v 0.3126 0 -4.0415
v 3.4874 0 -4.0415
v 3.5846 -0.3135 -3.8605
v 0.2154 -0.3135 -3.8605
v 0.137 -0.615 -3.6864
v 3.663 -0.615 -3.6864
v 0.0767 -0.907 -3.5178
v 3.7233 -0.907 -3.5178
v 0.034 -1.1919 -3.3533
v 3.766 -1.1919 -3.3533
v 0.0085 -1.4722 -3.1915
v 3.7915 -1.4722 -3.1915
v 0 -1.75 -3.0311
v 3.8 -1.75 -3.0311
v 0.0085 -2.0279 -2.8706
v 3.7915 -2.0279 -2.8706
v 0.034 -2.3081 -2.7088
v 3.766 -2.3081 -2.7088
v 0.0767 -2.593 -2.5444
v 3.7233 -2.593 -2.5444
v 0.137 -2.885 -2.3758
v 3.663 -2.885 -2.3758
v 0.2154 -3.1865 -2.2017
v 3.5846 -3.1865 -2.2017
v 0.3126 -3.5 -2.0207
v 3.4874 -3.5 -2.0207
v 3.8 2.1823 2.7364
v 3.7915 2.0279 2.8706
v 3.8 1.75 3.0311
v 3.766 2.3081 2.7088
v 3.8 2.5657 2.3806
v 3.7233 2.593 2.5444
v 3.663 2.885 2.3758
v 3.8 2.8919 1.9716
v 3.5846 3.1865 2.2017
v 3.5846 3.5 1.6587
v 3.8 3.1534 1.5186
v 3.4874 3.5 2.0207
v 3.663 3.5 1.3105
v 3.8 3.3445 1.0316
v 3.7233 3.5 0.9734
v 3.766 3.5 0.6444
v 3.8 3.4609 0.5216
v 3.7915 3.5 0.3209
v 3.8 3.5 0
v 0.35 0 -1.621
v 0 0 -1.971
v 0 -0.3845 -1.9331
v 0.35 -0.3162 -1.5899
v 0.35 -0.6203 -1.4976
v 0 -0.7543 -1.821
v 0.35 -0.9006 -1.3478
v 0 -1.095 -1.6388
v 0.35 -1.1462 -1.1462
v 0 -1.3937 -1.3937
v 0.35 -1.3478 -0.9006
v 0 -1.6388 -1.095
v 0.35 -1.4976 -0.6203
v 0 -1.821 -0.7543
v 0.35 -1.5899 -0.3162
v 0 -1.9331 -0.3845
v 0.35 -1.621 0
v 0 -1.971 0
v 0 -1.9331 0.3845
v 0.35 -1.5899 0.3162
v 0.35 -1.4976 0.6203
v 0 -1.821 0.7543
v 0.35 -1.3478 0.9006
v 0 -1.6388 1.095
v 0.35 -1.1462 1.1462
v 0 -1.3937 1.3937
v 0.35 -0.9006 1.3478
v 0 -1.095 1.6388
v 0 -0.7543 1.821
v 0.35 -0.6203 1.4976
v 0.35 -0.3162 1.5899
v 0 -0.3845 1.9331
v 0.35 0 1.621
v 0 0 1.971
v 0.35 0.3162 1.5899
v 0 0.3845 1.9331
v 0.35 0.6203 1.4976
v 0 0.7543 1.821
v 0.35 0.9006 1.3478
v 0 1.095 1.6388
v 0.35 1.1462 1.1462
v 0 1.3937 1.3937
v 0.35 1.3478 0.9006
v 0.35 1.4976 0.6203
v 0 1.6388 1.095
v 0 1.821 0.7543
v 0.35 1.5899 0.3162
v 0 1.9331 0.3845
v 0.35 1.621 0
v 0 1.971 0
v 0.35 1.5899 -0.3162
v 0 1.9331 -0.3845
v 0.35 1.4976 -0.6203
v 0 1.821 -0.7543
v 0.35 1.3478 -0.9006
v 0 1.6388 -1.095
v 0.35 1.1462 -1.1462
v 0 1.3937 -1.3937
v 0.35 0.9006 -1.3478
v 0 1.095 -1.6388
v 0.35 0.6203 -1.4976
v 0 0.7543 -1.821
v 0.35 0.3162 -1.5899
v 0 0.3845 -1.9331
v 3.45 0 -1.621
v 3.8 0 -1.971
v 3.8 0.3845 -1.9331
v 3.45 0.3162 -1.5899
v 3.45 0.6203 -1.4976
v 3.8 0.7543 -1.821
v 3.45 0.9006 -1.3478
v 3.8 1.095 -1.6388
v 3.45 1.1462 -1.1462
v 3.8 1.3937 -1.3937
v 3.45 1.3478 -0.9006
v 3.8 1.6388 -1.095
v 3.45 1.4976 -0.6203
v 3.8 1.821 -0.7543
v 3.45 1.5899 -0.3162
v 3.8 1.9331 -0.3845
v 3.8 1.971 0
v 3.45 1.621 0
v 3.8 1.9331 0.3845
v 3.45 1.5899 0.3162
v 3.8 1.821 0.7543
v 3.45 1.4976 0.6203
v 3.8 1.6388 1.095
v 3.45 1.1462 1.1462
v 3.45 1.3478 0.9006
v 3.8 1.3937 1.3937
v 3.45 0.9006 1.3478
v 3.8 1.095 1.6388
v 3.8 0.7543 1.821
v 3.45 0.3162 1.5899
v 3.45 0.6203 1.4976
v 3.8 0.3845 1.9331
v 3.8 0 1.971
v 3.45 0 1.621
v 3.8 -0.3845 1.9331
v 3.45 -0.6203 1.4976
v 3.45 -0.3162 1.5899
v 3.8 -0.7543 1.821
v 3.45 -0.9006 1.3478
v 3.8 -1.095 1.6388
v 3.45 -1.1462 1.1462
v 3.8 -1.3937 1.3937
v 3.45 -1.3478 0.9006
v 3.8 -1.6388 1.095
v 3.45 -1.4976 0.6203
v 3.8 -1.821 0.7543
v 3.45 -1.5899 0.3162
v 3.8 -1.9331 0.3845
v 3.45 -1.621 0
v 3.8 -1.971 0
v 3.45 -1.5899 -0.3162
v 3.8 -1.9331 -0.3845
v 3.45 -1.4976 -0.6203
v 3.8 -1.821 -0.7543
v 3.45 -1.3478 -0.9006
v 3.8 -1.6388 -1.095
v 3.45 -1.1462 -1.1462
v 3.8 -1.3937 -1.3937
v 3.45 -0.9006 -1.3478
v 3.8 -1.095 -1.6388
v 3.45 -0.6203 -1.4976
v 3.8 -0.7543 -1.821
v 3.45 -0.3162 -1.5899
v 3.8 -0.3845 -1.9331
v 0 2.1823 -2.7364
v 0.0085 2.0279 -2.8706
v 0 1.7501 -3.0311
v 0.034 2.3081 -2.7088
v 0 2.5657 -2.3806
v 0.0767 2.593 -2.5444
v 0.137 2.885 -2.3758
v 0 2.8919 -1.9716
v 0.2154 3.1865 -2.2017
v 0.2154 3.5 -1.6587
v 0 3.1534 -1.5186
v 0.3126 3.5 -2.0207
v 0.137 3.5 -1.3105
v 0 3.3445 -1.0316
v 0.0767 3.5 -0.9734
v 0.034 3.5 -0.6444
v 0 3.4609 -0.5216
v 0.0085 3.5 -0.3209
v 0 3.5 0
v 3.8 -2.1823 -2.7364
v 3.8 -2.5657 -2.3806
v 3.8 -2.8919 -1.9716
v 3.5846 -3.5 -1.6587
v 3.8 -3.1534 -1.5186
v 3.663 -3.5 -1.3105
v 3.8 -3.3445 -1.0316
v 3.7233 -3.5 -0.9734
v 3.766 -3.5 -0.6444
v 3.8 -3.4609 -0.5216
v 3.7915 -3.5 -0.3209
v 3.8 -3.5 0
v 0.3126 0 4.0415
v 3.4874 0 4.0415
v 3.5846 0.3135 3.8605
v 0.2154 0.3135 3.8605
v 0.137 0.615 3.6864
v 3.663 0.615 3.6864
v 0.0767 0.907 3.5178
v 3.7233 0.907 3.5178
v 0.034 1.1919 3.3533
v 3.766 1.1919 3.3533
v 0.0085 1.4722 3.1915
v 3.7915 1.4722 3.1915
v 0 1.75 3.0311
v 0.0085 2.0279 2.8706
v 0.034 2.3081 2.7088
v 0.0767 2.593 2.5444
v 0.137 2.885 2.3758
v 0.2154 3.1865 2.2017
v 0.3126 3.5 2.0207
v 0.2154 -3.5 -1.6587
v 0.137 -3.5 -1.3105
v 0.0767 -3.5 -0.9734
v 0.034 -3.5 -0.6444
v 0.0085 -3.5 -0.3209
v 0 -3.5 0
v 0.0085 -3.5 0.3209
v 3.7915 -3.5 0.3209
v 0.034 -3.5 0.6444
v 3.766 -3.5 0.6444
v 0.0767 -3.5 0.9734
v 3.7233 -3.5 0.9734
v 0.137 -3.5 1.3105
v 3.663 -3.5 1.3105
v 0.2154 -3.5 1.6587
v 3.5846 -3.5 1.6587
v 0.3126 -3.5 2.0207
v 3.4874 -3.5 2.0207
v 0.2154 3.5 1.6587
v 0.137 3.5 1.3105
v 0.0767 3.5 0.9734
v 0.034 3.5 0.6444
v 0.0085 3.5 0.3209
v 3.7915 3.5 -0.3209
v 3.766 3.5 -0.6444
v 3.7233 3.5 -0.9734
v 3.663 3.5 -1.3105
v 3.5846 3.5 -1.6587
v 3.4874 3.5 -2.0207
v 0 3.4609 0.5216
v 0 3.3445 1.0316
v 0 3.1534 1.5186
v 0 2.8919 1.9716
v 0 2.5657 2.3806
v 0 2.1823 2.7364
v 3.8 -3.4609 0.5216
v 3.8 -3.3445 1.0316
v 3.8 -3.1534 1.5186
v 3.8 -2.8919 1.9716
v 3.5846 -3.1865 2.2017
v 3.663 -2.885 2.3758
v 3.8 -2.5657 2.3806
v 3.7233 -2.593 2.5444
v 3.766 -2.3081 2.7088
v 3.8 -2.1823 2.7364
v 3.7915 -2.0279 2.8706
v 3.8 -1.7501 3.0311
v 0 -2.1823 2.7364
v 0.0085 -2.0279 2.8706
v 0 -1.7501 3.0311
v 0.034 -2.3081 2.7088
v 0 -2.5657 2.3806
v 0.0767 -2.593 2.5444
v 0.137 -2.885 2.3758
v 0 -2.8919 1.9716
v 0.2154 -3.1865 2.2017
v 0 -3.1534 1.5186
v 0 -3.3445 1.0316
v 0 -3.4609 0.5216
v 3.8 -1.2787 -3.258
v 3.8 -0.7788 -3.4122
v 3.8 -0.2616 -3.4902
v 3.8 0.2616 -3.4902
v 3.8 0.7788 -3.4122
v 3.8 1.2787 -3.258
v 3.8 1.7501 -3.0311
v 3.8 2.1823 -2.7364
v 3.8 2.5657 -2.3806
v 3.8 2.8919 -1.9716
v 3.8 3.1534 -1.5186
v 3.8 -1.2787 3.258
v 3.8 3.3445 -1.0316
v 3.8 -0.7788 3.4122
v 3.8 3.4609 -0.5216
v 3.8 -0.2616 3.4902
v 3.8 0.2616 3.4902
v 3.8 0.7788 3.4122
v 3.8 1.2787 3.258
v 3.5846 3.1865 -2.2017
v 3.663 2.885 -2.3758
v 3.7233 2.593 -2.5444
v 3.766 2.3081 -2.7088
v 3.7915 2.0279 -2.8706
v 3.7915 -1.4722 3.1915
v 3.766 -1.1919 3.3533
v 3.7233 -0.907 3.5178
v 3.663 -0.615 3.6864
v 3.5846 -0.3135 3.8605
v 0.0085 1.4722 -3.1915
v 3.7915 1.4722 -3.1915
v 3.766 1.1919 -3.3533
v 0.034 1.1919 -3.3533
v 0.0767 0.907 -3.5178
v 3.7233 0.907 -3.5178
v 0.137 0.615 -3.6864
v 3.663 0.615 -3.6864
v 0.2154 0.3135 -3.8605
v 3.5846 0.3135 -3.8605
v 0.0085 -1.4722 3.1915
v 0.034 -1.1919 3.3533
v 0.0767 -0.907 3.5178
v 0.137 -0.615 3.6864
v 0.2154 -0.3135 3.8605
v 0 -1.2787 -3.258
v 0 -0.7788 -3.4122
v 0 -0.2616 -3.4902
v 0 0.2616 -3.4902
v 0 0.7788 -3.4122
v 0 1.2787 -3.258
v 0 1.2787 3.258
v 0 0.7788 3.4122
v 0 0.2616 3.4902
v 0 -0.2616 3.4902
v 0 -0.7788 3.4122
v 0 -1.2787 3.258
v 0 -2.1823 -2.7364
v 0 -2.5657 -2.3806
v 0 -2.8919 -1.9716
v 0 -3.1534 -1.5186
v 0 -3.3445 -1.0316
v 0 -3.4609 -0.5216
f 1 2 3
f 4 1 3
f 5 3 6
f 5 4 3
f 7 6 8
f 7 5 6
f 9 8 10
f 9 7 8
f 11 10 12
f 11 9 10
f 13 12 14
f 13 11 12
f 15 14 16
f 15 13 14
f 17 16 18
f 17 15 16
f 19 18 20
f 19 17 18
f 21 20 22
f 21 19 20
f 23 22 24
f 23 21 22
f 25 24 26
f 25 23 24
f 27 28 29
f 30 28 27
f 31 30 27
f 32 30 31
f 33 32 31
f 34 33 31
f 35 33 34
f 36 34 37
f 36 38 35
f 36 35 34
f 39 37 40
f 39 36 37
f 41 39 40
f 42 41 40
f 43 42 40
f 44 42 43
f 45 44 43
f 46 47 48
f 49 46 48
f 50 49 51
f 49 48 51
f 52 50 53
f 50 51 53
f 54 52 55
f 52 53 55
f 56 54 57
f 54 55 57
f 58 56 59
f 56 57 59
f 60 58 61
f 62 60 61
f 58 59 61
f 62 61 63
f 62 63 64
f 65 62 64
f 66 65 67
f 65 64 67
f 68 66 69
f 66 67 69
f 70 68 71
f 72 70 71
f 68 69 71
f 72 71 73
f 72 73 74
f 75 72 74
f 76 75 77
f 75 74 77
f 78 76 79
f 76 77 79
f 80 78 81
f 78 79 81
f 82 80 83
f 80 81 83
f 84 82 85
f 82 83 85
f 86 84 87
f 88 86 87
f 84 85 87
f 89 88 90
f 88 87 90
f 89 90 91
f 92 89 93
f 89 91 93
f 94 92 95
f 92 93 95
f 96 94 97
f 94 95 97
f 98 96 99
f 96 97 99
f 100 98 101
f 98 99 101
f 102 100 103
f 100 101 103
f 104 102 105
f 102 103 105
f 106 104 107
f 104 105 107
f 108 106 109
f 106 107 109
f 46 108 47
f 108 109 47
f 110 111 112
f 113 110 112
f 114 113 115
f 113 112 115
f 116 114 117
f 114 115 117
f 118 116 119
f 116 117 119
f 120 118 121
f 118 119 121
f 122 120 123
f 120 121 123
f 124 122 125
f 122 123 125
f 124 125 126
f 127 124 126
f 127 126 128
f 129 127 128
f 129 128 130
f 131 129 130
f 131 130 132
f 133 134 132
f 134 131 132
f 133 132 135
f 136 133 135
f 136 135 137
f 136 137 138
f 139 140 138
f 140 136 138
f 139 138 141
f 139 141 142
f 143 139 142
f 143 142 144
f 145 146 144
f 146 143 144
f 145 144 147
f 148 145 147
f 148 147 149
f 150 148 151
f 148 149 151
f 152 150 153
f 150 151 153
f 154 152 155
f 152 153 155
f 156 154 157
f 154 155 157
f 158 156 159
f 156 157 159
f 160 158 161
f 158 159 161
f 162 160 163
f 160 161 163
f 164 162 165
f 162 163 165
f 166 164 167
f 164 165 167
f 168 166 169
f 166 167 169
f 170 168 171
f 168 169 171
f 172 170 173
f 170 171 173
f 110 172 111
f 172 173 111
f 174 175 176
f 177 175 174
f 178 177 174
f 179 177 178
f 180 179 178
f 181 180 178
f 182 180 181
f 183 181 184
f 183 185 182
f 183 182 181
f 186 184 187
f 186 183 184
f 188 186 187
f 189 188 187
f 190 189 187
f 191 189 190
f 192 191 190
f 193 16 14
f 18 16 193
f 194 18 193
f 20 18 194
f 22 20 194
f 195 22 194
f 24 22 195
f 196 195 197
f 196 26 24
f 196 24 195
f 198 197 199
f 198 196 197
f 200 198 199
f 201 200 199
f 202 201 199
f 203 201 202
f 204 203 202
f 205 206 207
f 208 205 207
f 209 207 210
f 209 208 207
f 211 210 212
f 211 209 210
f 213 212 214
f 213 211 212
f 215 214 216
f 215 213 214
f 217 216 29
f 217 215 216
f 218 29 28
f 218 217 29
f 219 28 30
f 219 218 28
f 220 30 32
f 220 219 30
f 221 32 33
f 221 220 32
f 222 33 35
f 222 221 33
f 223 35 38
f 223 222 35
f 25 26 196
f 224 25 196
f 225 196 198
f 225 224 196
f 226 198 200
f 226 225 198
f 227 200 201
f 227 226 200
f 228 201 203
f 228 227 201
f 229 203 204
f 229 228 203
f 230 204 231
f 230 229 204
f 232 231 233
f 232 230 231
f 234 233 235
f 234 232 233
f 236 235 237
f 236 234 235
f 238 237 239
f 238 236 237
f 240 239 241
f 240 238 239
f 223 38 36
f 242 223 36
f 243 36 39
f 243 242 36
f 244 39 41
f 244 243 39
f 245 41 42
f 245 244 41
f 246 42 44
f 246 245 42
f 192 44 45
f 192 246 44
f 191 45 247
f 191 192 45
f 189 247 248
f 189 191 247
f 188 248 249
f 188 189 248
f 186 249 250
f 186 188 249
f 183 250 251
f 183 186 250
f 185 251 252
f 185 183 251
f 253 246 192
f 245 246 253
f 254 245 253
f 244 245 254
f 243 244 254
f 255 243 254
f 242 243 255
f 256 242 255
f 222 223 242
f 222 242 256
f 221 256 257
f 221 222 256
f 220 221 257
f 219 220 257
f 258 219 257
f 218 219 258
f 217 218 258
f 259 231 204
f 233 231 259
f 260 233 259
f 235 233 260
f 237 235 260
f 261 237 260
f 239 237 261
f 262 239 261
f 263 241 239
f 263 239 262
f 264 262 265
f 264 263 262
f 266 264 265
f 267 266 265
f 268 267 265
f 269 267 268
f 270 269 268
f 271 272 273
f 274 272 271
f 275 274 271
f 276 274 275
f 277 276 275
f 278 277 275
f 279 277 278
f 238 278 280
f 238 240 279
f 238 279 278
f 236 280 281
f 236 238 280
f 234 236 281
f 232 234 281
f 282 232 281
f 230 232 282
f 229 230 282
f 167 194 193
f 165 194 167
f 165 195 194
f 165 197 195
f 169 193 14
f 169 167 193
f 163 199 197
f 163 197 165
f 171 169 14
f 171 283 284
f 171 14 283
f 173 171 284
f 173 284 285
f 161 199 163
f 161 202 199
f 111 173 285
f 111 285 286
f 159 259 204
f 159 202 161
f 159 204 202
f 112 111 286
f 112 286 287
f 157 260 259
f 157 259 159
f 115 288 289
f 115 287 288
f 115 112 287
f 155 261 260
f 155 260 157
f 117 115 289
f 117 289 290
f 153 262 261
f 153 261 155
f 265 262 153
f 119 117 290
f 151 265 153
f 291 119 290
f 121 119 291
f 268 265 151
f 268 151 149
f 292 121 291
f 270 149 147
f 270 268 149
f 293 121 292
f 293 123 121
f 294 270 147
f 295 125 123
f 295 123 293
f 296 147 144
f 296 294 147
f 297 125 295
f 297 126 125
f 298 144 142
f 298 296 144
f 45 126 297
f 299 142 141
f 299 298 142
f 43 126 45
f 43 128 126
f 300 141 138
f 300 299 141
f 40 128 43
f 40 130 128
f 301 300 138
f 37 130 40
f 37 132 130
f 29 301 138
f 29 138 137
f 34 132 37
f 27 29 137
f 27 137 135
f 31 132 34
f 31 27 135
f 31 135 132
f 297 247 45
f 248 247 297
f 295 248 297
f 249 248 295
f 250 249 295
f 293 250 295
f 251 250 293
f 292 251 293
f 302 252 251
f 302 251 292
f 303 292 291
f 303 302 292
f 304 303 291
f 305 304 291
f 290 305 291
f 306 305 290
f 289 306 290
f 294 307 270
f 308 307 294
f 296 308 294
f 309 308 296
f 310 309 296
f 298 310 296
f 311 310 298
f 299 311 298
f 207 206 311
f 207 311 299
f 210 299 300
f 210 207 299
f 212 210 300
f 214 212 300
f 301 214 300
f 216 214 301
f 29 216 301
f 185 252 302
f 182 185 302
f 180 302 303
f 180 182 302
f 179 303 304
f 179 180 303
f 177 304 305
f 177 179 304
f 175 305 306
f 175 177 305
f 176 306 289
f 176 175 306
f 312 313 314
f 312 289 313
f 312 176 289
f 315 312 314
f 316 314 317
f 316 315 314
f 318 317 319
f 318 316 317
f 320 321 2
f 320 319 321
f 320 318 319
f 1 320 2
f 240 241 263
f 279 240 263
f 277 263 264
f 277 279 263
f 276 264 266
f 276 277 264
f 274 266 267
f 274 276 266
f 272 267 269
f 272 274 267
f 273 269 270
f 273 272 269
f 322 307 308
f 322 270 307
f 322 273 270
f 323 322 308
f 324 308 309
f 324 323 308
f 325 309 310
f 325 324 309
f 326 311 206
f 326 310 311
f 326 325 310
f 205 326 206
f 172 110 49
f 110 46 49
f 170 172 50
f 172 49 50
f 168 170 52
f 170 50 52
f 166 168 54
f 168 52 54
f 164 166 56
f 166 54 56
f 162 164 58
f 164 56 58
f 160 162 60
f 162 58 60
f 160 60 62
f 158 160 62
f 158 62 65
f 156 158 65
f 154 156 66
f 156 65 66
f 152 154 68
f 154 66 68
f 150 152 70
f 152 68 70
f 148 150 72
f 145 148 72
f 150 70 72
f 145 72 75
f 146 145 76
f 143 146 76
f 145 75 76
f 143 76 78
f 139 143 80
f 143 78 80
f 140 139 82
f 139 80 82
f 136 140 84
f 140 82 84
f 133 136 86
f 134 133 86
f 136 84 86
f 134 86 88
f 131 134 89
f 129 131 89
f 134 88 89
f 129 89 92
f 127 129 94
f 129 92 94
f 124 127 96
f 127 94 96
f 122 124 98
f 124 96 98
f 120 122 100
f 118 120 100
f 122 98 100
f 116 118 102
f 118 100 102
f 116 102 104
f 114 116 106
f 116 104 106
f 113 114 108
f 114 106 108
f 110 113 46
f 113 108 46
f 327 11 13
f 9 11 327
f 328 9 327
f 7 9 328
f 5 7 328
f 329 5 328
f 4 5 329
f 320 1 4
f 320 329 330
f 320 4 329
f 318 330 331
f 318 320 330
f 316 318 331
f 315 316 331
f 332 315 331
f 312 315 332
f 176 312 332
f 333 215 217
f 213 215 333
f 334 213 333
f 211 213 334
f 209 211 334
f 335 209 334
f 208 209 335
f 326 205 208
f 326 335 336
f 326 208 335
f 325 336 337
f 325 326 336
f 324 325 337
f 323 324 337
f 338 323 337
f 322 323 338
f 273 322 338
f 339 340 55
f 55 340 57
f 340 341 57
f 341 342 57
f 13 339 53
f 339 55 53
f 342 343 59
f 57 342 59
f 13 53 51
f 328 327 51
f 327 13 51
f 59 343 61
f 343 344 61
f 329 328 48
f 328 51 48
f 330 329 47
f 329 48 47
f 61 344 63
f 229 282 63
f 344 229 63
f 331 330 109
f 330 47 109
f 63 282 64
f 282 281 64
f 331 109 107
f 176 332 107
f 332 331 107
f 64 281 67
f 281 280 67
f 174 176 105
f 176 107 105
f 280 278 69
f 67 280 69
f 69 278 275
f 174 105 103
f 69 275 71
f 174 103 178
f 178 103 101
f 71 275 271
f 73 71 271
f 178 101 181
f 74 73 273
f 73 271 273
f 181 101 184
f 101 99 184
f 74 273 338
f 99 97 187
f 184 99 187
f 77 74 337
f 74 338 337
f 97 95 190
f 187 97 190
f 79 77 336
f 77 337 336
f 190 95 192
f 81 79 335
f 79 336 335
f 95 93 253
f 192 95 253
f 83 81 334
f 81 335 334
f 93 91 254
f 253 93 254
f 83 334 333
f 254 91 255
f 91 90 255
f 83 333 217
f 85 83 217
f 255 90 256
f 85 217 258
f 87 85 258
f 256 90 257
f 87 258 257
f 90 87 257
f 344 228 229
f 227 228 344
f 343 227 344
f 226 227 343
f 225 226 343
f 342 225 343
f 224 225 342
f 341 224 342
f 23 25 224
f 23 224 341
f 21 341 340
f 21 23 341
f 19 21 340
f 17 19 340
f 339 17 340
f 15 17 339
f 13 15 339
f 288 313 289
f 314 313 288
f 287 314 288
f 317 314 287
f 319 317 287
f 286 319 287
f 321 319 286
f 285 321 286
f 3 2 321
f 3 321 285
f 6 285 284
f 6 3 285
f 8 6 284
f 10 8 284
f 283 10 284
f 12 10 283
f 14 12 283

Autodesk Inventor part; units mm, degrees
sketch "Boceto1" plane through (0, 0, 0) normal (1, 0, 0) x (0, 1, 0)
  line L0 (3.5, 2.0207) -> (3.5, -2.0207)
  line L1 (3.5, -2.0207) -> (0, -4.0415)
  line L2 (0, -4.0415) -> (-3.5, -2.0207)
  line L3 (-3.5, -2.0207) -> (-3.5, 2.0207)
  line L4 (-3.5, 2.0207) -> (0, 4.0415)
  line L5 (0, 4.0415) -> (3.5, 2.0207)
  circle A0 centre (0, 0) radius 3.5 construction
  dimension "d0" = 7
extrude "Extrusión1" add sketch "Boceto1" along normal blind 3.8
sketch "Boceto2" plane through (3.8, 0, 0) normal (1, 0, 0) x (0, 1, 0)
  line L0 (-3.5, 2.0207) -> (0, 4.0415) projected
  line L1 (0, -4.0415) -> (-3.5, -2.0207) projected
  line L2 (-3.5, 2.0207) -> (3.5, -2.0207) construction
  line L3 (-3.5, -2.0207) -> (3.5, 2.0207) construction
  point P0 (0, 0)
hole "Agujero1" at (3.8, 0, 0) direction (-1, 0, 0) diameter 3.242 end through all thread size "M4x0.7" class "6H" standard "ISO Metric profile"
chamfer "Chaflán1" distance 0.35 angle 45 2 edges at (3.8, 0, 1.621) (0, 0, 1.621)
sketch "Boceto3" plane through (0, 0, 0) normal (0, 1, 0) x (-1, 0, 0)
  line L0 (-7.0172, 0) -> (2.1698, 0) projected
  line L1 (-5.7048, 0) -> (0.8574, 0)
  line L2 (-3.8, 0) -> (-3.8, -4.0415)
  line L3 (-3.8, -4.0415) -> (0, -4.0415)
  line L4 (0, -4.0415) -> (0, 0)
  line L5 (-3.8, -2.0207) -> (-3.8, -4.0415) projected
  line L6 (0, -2.0207) -> (0, -4.0415) projected
  line L7 (0, -4.0415) -> (-3.8, -4.0415) projected
  line L8 (-3.8, -3.5) -> (-3.4874, -4.0415)
  line L9 (-3.8, -4.0415) -> (-3.8, -3.5)
  line L10 (-3.8, -4.0415) -> (-3.4874, -4.0415)
  line L11 (0, -3.5) -> (-0.3126, -4.0415)
  line L12 (-0.3126, -4.0415) -> (0, -4.0415)
  line L13 (0, -4.0415) -> (0, -3.5)
  dimension "d32" = 3.5
  dimension "d33" = 30
revolve "Revolución1" cut sketch "Boceto3" angle 360 about axis through (0, 0, 0) along (-1, 0, 0) contours L8 L3 L2 | L4 L3 L11
ref_plane "MSC_PT1" through (3.8, 0, 0) normal (1, 0, 0) x (0, 1, 0)
ref_plane "MSC_PT2" through (0, 0, 0) normal (-1, 0, 0) x (0, -1, 0)
ref_plane "MSC_PF1" through (0, 0, 0) normal (1, 0, 0) x (0, 1, 0)
equation "\"d0\" = Smax"
equation "\"d1\" = Mmax"
equation "\"d10\" = 0.5 * PTC"
equation "\"d32\" = 0.5 * Smax"
equation "\"NND\" = 4"
equation "\"Smax\" = 7"
equation "\"Mmax\" = 3.8"
equation "\"PTC\" = 0.7"
equation "\"THREADDIA\" = NND"
equation "\"TEMPLATE\" = 1.2345"
properties part number "ANSI B18.2.4.2M - M4x0,7" material "Acero, suave"
